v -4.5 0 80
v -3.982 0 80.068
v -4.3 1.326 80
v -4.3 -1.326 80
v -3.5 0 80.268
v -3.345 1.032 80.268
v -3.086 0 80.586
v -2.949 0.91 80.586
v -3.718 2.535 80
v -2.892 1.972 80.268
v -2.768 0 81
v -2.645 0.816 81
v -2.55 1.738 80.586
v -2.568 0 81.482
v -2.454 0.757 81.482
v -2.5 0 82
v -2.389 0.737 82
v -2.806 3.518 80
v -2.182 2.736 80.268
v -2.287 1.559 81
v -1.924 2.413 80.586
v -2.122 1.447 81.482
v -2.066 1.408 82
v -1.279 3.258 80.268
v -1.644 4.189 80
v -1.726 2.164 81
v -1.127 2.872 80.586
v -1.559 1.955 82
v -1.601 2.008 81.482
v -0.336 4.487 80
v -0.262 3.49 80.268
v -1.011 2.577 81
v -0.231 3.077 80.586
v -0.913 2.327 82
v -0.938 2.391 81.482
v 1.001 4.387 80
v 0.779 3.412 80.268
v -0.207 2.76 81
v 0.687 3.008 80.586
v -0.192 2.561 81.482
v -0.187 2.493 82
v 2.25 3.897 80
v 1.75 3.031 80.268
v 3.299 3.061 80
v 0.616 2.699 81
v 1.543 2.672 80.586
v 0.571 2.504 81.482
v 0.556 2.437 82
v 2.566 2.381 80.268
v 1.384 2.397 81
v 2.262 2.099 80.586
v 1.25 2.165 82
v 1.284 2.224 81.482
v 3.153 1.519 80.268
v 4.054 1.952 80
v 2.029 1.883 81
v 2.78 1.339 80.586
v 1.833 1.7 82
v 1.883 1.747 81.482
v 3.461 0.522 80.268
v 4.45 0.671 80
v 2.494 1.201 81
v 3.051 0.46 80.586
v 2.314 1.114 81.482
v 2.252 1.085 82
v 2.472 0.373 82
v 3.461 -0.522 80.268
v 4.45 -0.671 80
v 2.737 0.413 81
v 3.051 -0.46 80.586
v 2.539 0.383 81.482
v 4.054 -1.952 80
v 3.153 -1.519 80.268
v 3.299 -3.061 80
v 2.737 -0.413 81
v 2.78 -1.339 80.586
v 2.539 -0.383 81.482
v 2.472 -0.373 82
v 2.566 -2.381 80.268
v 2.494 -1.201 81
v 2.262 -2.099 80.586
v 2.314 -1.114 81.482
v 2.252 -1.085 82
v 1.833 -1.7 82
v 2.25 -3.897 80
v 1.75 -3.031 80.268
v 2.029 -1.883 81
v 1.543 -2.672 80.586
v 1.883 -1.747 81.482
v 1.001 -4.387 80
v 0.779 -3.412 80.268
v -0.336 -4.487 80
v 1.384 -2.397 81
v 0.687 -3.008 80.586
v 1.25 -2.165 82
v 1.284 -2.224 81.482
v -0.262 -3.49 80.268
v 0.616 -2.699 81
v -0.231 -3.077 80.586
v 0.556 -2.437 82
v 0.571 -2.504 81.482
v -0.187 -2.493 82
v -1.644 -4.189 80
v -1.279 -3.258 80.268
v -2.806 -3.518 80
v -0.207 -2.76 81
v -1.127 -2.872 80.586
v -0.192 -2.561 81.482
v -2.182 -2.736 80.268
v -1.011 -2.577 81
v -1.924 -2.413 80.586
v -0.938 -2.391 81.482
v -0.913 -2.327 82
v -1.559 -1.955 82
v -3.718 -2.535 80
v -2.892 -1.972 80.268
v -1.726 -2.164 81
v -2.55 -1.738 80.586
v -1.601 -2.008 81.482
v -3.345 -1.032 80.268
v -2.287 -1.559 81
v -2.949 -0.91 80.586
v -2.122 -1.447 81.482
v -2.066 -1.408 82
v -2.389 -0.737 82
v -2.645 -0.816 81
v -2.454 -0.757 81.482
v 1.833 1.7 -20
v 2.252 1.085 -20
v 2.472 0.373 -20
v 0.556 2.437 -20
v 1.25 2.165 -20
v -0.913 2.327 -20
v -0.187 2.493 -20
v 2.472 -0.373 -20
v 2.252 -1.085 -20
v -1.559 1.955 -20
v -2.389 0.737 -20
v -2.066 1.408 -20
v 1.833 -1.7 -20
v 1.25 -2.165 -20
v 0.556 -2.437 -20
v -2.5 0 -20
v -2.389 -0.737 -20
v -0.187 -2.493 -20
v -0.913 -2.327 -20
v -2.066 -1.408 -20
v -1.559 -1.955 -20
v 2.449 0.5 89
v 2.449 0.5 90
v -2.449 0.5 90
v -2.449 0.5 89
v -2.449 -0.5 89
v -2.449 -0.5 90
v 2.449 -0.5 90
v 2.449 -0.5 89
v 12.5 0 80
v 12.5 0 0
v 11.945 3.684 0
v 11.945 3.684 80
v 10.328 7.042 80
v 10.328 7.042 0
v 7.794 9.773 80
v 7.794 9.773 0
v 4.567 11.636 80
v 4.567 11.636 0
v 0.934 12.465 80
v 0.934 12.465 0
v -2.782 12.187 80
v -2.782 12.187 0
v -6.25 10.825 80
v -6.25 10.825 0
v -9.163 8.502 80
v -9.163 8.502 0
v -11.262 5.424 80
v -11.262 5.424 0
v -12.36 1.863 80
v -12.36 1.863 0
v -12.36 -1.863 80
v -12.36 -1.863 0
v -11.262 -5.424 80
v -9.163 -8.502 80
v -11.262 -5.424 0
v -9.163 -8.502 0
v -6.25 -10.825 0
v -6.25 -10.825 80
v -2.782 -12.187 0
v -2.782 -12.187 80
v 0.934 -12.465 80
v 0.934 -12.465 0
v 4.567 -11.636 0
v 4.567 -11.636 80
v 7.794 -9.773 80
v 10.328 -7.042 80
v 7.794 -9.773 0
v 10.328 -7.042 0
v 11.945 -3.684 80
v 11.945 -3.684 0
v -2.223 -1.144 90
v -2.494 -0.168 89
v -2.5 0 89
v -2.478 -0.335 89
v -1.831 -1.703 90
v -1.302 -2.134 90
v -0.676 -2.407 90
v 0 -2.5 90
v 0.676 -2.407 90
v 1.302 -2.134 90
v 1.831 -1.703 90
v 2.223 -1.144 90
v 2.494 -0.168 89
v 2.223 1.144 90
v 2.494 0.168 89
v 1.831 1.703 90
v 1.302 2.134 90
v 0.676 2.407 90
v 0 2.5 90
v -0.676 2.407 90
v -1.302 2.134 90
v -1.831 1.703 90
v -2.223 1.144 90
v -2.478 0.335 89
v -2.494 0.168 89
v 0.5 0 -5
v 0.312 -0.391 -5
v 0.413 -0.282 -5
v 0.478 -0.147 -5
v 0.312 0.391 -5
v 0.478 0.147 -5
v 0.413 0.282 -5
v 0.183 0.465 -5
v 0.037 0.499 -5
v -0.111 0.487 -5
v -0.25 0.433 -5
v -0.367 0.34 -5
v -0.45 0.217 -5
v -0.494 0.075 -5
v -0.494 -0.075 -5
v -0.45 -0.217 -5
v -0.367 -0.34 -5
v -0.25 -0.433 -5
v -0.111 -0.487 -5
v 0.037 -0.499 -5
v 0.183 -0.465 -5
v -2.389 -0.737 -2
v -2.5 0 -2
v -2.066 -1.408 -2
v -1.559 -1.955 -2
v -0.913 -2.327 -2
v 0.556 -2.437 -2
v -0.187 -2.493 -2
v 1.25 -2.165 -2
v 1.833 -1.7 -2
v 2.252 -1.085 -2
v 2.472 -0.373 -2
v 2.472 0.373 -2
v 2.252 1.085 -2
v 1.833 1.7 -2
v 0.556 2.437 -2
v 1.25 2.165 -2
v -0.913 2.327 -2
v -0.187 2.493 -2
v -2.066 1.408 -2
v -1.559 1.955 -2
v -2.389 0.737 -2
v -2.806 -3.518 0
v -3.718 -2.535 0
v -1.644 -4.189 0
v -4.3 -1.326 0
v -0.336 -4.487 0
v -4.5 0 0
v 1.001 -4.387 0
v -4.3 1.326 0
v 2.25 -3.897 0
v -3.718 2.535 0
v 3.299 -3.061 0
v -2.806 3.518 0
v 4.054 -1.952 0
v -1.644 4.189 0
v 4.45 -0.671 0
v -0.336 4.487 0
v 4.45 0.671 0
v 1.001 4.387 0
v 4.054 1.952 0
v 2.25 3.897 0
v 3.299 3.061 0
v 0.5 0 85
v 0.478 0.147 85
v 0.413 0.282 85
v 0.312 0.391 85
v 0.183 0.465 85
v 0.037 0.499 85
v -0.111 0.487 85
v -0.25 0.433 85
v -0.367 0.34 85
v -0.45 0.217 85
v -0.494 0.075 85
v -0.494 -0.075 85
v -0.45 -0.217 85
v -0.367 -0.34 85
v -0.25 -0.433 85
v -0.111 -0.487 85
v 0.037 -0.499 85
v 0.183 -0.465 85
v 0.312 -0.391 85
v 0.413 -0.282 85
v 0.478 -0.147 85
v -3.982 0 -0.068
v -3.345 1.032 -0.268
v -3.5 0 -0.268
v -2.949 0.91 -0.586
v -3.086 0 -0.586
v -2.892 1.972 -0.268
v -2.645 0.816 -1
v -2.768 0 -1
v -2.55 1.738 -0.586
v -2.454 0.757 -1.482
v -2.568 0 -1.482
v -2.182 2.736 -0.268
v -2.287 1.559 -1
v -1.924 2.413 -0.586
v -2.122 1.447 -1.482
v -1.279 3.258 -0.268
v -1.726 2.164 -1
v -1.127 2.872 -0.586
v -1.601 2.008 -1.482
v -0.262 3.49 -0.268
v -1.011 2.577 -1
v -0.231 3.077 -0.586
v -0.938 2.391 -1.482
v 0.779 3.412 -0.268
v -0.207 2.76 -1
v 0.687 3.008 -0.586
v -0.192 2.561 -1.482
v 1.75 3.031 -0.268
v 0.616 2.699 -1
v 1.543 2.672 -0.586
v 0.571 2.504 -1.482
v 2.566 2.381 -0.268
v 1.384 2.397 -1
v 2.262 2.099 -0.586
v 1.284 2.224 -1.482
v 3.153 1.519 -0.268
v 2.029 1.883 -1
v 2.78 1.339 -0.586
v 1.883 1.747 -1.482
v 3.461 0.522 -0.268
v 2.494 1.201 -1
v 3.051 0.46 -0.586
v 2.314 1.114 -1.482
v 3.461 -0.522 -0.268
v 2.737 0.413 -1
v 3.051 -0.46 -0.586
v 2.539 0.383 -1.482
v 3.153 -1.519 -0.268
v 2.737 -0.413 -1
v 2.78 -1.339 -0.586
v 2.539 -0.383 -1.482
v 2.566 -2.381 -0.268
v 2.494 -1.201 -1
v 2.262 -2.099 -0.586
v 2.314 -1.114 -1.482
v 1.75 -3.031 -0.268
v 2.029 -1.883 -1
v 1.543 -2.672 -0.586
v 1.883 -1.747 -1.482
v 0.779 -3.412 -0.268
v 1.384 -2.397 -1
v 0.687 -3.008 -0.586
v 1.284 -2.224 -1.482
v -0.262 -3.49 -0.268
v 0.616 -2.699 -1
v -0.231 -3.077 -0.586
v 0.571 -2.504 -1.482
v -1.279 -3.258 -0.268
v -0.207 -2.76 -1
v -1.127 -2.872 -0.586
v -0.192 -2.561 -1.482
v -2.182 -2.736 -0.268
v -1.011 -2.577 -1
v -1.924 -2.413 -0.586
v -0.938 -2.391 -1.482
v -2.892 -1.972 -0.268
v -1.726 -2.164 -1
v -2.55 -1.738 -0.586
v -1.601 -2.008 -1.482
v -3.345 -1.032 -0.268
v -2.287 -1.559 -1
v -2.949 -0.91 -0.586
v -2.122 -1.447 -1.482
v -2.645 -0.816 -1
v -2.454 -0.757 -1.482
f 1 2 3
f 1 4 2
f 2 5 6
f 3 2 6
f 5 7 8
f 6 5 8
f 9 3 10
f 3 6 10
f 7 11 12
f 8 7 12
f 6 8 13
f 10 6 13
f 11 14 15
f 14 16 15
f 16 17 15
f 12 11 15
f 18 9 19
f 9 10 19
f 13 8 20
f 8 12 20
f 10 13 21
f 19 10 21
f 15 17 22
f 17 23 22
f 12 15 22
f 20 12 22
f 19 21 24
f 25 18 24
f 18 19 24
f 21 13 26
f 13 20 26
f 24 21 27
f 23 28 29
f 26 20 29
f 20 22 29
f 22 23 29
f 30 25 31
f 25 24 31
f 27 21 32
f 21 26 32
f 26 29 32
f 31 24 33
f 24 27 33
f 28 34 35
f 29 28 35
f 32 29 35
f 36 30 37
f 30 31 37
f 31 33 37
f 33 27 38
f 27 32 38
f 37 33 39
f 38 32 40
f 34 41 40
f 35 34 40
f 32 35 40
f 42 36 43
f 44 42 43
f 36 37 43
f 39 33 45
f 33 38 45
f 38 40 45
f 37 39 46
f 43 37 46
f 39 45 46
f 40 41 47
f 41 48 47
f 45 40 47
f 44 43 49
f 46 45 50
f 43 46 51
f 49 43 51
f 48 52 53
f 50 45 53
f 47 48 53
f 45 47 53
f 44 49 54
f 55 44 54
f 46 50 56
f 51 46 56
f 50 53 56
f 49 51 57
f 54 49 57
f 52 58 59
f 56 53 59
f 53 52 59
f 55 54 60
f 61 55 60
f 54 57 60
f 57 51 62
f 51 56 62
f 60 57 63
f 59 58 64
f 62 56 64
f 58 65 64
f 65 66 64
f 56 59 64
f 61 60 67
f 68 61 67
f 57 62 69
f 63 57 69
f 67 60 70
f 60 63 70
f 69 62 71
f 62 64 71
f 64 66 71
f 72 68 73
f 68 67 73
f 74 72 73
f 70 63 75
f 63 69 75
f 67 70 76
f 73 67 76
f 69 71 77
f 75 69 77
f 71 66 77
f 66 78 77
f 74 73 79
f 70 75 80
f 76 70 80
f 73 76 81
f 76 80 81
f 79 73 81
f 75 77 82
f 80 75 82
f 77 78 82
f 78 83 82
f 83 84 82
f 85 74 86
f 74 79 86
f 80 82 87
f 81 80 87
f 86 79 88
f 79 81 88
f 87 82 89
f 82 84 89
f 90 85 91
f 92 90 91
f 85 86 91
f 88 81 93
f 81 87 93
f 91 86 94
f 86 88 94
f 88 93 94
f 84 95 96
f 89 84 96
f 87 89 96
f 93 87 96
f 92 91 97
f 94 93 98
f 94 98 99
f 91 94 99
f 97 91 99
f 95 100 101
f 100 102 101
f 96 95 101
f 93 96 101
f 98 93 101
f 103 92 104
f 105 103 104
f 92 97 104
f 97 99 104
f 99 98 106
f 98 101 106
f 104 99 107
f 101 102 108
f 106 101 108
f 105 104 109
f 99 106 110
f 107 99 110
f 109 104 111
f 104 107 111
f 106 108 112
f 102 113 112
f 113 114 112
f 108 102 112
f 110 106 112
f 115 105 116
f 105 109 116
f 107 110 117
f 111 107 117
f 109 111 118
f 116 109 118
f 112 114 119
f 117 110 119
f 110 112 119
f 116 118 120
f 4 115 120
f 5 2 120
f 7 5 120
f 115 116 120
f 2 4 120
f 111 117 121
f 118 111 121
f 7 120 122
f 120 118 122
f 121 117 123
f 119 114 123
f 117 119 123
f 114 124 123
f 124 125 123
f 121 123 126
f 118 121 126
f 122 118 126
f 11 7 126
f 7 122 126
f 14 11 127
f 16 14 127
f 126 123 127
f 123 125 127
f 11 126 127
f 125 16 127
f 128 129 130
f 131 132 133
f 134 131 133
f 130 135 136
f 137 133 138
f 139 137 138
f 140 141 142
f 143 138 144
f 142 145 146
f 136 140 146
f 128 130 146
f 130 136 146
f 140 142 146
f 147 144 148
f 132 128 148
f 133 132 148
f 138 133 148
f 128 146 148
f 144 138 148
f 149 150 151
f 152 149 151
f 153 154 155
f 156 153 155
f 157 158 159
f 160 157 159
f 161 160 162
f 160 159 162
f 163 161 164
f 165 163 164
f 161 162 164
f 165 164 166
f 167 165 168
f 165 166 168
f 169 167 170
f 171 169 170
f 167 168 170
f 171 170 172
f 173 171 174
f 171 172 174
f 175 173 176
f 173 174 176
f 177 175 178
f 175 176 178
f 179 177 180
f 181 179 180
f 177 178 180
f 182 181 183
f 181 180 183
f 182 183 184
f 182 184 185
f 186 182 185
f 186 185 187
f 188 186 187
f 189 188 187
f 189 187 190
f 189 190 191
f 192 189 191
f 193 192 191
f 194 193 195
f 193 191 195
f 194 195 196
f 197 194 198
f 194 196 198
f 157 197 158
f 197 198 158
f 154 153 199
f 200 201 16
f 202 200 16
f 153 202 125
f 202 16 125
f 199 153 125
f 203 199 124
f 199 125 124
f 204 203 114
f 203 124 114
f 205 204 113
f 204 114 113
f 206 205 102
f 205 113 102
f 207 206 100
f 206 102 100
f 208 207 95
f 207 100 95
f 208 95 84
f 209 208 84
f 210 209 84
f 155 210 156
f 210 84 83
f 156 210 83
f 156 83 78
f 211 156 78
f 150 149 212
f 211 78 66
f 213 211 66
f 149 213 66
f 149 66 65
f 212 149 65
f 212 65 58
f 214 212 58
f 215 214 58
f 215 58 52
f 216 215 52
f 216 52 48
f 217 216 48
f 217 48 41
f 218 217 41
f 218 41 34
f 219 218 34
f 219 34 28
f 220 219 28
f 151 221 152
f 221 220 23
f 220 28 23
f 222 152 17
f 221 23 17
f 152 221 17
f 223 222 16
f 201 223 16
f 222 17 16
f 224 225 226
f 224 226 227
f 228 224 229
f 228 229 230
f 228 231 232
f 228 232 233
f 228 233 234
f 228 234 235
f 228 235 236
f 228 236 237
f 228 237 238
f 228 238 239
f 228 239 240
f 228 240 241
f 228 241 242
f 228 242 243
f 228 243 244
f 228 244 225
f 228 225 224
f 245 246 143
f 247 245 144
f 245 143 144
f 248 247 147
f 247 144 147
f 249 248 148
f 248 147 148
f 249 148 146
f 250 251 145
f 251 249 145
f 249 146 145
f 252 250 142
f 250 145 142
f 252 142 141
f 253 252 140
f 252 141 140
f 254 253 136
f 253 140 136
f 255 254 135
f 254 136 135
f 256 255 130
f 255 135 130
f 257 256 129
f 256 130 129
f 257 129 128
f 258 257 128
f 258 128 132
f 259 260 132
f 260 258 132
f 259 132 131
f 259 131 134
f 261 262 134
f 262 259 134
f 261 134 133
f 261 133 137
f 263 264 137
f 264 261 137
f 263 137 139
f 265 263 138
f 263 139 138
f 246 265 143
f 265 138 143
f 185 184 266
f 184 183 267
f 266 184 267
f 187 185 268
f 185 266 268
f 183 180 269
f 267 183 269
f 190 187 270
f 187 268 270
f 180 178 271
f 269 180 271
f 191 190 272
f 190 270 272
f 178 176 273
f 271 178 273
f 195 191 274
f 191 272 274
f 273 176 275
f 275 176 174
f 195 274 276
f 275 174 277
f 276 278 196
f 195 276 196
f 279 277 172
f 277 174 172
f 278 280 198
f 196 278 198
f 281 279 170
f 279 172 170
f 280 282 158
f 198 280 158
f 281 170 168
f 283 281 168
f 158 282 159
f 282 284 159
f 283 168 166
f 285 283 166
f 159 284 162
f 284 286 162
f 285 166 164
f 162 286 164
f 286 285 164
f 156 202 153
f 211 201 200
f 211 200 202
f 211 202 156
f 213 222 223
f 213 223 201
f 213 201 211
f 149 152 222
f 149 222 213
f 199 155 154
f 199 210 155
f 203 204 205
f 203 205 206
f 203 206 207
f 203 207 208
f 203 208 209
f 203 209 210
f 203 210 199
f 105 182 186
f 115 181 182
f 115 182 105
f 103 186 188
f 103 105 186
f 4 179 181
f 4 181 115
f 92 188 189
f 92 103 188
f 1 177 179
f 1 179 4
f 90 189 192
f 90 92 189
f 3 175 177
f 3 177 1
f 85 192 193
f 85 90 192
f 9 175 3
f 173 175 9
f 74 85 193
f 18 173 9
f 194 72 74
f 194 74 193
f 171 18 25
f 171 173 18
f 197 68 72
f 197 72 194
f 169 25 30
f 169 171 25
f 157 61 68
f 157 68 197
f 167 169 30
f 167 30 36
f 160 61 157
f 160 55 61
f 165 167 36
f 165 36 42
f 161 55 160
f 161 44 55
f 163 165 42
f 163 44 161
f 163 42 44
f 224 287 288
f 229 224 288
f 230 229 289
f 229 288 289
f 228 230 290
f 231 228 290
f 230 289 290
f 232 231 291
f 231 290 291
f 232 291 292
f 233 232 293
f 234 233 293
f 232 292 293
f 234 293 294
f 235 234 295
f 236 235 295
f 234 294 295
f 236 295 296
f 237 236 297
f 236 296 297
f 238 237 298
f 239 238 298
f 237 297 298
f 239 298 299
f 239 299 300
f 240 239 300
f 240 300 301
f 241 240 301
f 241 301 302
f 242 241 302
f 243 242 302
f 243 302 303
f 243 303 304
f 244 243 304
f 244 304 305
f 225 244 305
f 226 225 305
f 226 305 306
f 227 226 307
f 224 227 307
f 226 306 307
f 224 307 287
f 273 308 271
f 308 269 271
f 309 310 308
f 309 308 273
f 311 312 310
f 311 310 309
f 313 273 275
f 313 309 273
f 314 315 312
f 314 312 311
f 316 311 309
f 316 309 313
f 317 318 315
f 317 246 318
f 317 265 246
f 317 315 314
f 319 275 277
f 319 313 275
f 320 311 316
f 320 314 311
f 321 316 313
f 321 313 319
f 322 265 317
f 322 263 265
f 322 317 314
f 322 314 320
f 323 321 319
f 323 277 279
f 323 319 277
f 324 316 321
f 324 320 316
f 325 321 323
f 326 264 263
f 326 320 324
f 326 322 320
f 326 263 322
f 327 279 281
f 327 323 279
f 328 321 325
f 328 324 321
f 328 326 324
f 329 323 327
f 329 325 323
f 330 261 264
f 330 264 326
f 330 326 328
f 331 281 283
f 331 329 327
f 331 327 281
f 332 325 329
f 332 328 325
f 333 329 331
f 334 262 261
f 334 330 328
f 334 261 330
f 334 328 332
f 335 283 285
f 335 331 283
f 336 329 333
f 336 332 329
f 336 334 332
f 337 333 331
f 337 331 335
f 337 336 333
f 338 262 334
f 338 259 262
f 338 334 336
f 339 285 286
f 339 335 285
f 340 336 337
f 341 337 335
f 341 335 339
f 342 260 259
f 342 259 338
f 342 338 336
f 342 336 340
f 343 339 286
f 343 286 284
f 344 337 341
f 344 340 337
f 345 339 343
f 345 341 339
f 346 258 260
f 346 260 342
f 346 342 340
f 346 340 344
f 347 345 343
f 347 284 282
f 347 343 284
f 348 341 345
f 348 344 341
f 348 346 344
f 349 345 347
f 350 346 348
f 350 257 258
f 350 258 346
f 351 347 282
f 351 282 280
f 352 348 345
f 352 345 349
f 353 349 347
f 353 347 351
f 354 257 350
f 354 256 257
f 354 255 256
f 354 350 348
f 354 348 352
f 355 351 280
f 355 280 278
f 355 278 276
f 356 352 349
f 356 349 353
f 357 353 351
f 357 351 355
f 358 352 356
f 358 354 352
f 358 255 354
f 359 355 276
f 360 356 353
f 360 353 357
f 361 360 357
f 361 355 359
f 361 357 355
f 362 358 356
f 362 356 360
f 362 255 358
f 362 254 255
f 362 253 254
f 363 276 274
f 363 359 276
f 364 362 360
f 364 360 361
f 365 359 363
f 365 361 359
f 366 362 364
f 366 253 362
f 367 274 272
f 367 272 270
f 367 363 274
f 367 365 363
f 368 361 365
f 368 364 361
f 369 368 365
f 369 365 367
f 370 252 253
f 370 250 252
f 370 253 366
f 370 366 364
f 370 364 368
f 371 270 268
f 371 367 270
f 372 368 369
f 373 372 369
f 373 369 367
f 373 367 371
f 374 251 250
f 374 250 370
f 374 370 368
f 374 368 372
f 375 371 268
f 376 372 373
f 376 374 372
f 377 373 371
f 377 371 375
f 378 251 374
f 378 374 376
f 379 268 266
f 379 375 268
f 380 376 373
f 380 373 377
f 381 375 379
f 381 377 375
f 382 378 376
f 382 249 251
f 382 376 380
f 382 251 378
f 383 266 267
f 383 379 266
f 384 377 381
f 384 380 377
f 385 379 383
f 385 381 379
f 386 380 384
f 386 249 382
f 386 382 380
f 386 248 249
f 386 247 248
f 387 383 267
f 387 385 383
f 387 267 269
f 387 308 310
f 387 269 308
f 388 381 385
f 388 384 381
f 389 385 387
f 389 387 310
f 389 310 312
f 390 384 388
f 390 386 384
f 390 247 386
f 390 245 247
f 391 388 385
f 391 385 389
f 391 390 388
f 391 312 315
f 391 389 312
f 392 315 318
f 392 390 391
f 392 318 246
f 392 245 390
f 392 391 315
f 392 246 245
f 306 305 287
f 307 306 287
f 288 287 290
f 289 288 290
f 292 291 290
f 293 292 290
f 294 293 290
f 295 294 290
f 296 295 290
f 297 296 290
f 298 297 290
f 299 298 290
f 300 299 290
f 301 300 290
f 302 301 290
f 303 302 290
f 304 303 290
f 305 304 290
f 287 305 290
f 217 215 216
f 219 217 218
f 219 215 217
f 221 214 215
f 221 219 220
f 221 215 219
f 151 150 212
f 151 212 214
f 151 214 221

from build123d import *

# Parameters (mm, degrees)
ESQUISSE1_R             = 12.5
BOSS_EXTRU_1_DEPTH      = 80
BOSS_EXTRU_2_DEPTH      = 90
BOSS_EXTRU_2_DEPTH_BACK = 20
ESQUISSE2_R             = 2.5
CONG_1_R                = 2
CONG_2_R                = 2
ENL_V_START             = -5
ESQUISSE3_R             = 0.5
ENL_V_MAT_EXTRU_1_DEPTH = 90
ENL_V_MAT_EXTRU_3_DEPTH = 1


with BuildPart() as part:
    # Esquisse1 → Boss.-Extru.1 (new body)
    with BuildSketch(Plane.XY):
        Circle(ESQUISSE1_R)
    extrude(amount=BOSS_EXTRU_1_DEPTH)

    # Esquisse2 → Boss.-Extru.2 (add, two sides: drawn at the far end of the back side and taken through both)
    with BuildSketch(Plane.XY.offset(-BOSS_EXTRU_2_DEPTH_BACK)):
        with Locations(Location((0, 0, 0), (0, 0, 180))):
            Circle(ESQUISSE2_R)
    extrude(amount=BOSS_EXTRU_2_DEPTH + BOSS_EXTRU_2_DEPTH_BACK)

    # Congé1
    cong_1_edges = [part.edges().sort_by_distance(p)[0] for p in [
        (2.5, 0, 80),
    ]]
    fillet(cong_1_edges, radius=CONG_1_R)

    # Congé2
    cong_2_edges = [part.edges().sort_by_distance(p)[0] for p in [
        (2.5, 0, 0),
    ]]
    fillet(cong_2_edges, radius=CONG_2_R)

    # Esquisse3 → Enlèv. mat.-Extru.1 (cut)
    with BuildSketch(Plane.XY.offset(90).offset(ENL_V_START)):
        Circle(ESQUISSE3_R)
    extrude(amount=-ENL_V_MAT_EXTRU_1_DEPTH, mode=Mode.SUBTRACT)

    # Esquisse5 → Enlèv. mat.-Extru.3 (cut)
    with BuildSketch(Plane.XY.offset(90)):
        with BuildLine():
            Line((-2.449489743, -0.5), (2.449489743, -0.5))
            ThreePointArc((2.449489743, -0.5), (2.5, 0), (2.449489743, 0.5))
            Line((2.449489743, 0.5), (-2.449489743, 0.5))
            ThreePointArc((-2.449489743, 0.5), (-2.5, 0), (-2.449489743, -0.5))
        make_face()
    extrude(amount=-ENL_V_MAT_EXTRU_3_DEPTH, mode=Mode.SUBTRACT)


solid = part.part
